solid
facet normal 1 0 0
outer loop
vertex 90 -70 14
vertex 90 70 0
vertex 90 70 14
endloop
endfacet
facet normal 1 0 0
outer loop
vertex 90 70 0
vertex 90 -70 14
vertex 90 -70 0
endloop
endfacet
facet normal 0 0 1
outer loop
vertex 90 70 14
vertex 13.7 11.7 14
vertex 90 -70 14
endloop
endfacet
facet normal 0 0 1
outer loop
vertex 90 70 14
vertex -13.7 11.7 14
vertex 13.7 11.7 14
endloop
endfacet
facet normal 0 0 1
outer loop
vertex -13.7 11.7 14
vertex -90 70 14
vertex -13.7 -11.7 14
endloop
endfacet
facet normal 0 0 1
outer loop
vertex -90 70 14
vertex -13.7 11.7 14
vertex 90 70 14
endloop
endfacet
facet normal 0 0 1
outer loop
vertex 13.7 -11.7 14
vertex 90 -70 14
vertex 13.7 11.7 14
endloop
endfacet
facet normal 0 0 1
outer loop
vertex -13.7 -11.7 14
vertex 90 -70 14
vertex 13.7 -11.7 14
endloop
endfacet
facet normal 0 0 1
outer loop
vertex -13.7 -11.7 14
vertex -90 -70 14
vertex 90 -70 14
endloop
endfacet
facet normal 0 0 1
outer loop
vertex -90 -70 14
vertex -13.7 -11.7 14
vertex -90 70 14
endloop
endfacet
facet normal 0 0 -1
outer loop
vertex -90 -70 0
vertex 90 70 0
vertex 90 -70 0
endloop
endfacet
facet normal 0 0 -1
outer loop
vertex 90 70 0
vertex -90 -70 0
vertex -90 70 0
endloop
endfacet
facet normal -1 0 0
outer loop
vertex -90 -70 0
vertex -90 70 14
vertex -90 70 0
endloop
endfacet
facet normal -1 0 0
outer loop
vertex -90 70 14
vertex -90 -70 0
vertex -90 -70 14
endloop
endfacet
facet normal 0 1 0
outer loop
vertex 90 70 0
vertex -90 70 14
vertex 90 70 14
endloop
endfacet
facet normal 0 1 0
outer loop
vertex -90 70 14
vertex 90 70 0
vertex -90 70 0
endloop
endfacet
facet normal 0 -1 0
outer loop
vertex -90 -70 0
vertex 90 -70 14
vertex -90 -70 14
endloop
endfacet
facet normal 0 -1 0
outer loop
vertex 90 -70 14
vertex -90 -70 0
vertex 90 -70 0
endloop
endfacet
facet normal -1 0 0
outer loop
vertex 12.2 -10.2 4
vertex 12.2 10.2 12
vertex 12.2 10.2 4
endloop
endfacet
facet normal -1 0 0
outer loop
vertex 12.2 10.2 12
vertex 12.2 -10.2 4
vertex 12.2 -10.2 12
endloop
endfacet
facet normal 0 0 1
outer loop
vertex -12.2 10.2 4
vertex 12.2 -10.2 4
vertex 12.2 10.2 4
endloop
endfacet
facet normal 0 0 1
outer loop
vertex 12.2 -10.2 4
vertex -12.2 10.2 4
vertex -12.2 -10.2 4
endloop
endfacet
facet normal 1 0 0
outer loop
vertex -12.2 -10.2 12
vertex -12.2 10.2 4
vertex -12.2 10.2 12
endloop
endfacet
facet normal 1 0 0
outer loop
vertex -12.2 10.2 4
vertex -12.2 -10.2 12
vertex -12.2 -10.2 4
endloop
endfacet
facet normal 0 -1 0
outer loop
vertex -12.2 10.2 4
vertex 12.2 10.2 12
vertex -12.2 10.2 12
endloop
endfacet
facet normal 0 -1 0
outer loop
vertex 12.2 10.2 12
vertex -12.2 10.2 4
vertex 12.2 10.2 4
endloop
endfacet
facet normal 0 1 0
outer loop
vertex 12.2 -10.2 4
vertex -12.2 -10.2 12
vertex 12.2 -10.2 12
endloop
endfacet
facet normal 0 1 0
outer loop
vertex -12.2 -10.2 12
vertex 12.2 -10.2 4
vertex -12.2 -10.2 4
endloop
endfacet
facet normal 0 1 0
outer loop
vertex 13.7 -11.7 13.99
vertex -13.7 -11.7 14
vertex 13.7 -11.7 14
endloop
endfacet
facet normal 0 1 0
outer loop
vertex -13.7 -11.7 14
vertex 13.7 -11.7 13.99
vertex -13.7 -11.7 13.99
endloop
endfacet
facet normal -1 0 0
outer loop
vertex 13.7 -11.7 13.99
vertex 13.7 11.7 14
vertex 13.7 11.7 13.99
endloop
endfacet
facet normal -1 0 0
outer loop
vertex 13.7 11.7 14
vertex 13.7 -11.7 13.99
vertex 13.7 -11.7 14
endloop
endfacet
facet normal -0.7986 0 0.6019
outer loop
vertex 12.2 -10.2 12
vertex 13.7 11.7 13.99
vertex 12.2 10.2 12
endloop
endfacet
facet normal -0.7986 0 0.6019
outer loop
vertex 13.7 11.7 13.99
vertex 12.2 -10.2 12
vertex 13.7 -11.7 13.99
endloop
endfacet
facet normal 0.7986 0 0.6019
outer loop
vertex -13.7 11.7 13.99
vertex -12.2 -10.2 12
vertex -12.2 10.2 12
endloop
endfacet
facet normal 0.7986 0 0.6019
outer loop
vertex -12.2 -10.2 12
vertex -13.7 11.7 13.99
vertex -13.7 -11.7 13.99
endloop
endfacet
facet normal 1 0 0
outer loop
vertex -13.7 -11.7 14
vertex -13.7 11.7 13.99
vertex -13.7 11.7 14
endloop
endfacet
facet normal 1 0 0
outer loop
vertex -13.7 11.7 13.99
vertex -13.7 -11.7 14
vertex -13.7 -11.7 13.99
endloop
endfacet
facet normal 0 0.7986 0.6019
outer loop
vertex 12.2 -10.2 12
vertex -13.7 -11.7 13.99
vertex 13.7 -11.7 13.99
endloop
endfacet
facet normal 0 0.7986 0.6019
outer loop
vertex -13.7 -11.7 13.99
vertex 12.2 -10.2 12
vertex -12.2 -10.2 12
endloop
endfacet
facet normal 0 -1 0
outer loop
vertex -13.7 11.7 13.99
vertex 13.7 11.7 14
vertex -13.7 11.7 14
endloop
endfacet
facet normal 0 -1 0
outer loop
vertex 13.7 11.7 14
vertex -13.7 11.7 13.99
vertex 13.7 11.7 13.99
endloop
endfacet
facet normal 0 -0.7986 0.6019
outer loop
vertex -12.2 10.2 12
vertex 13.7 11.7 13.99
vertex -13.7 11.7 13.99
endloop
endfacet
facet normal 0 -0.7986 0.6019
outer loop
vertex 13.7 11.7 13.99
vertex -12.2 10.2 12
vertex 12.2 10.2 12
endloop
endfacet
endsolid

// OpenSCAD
// Headphone stand: base, post, hanger. Units mm. Print orientation = export orientation (+Z up).
part = "base"; // [base, post, hanger, assembly]
cadverify_only = "";

/* Parameters */
base_L = 180; base_W = 140; base_H = 14;
base_sock_L = 24.4; base_sock_W = 20.4; base_sock_D = 10; // depth from top
base_floor = base_H - base_sock_D; // 4
base_cham_H = 2; base_cham_extra = 1.5; // per side funnel

post_low_L = 24; post_low_W = 20; post_low_H = 10;
post_flare_H = 6;
post_shaft_L = 34; post_shaft_W = 28;
post_shaft_bot = post_low_H + post_flare_H; // 16
post_shaft_top = 230;
post_shaft_H = post_shaft_top - post_shaft_bot; // 214
post_up_L = 20; post_up_W = 16; post_up_H = 12;
post_up_cham_H = 1.5; post_up_cham_extra = 1.5; // per side taper at top
post_H = post_shaft_top + post_up_H; // 242

hanger_L = 120; hanger_W = 36; hanger_base_H = 14; hanger_R = 18; // half-cyl radius = W/2
hanger_cyl_H = 18; // cylinder peak 14+18=32
lip_L = 10; lip_W = 36; lip_bot = 14; lip_top = 36; // end stops 14..36
hanger_H = 36;
hanger_sock_L = 20.4; hanger_sock_W = 16.4; hanger_sock_D = 12; // straight depth from bottom
hanger_roof_H = 10; // triangular roof above straight, ridge along X
hanger_cham_H = 2; hanger_cham_extra = 1.5;

asm_post_Z = base_floor; // 4, post bottom in assembly
asm_hanger_Z = 234; // hanger bottom in assembly
// shaft top 230 + post bottom 4 = 234 = hanger bottom; tenon 230..242 -> hanger 0..12; hanger top 234+36=270

module instance(name, part, unit = 1) {
    echo(cadverify_instance = [name, part, unit]);
    if (cadverify_only == "" || cadverify_only == name) children();
}

module base_part() {
    difference() {
        translate([-base_L/2, -base_W/2, 0]) cube([base_L, base_W, base_H]);
        // straight socket
        translate([-base_sock_L/2, -base_sock_W/2, base_floor])
            cube([base_sock_L, base_sock_W, base_sock_D+0.01]);
        // entry funnel (frustum widening upward)
        hull() {
            translate([-base_sock_L/2, -base_sock_W/2, base_H-base_cham_H])
                cube([base_sock_L, base_sock_W, 0.01]);
            translate([-(base_sock_L/2+base_cham_extra), -(base_sock_W/2+base_cham_extra), base_H-0.01])
                cube([base_sock_L+2*base_cham_extra, base_sock_W+2*base_cham_extra, 0.01]);
        }
    }
}

module post_part() {
    // lower tenon (press fit into base)
    translate([-post_low_L/2, -post_low_W/2, 0]) cube([post_low_L, post_low_W, post_low_H]);
    // flare collar 45deg-compatible transition to shaft
    hull() {
        translate([-post_low_L/2, -post_low_W/2, post_low_H-0.01])
            cube([post_low_L, post_low_W, 0.01]);
        translate([-post_shaft_L/2, -post_shaft_W/2, post_shaft_bot-0.01])
            cube([post_shaft_L, post_shaft_W, 0.01]);
    }
    // shaft
    translate([-post_shaft_L/2, -post_shaft_W/2, post_shaft_bot])
        cube([post_shaft_L, post_shaft_W, post_shaft_H]);
    // upper tenon straight part
    translate([-post_up_L/2, -post_up_W/2, post_shaft_top])
        cube([post_up_L, post_up_W, post_up_H-post_up_cham_H]);
    // upper tenon lead chamfer (tapers inward going up)
    hull() {
        translate([-post_up_L/2, -post_up_W/2, post_H-post_up_cham_H-0.01])
            cube([post_up_L, post_up_W, 0.01]);
        translate([-(post_up_L/2-post_up_cham_extra), -(post_up_W/2-post_up_cham_extra), post_H-0.01])
            cube([post_up_L-2*post_up_cham_extra, post_up_W-2*post_up_cham_extra, 0.01]);
    }
}

module hanger_part() {
    difference() {
        union() {
            // base box
            translate([-hanger_L/2, -hanger_W/2, 0]) cube([hanger_L, hanger_W, hanger_base_H]);
            // rounded top: half cylinder along X
            intersection() {
                translate([0, 0, hanger_base_H]) rotate([0, 90, 0])
                    cylinder(r=hanger_R, h=hanger_L, center=true, $fn=128);
                translate([-hanger_L/2, -hanger_W/2, hanger_base_H]) cube([hanger_L, hanger_W, hanger_cyl_H]);
            }
            // end stops (full height from base top, no floating ledge)
            for (sx=[-1,1])
                translate([sx*(hanger_L/2-lip_L), -lip_W/2, lip_bot])
                    cube([lip_L, lip_W, lip_top-lip_bot]);
        }
        // straight socket
        translate([-hanger_sock_L/2, -hanger_sock_W/2, 0])
            cube([hanger_sock_L, hanger_sock_W, hanger_sock_D]);
        // entry funnel at mouth (widens downward)
        hull() {
            translate([-hanger_sock_L/2, -hanger_sock_W/2, hanger_cham_H])
                cube([hanger_sock_L, hanger_sock_W, 0.01]);
            translate([-(hanger_sock_L/2+hanger_cham_extra), -(hanger_sock_W/2+hanger_cham_extra), -0.01])
                cube([hanger_sock_L+2*hanger_cham_extra, hanger_sock_W+2*hanger_cham_extra, 0.01]);
        }
        // pointed roof above straight (ridge along X), self-supporting slopes
        // closed wedge: sharp apex edge, no flat -> no overhang patch
        polyhedron(
            points = [
                [-hanger_sock_L/2, -hanger_sock_W/2, hanger_sock_D],
                [ hanger_sock_L/2, -hanger_sock_W/2, hanger_sock_D],
                [ hanger_sock_L/2,  hanger_sock_W/2, hanger_sock_D],
                [-hanger_sock_L/2,  hanger_sock_W/2, hanger_sock_D],
                [-hanger_sock_L/2, 0, hanger_sock_D+hanger_roof_H],
                [ hanger_sock_L/2, 0, hanger_sock_D+hanger_roof_H]
            ],
            faces = [
                [0, 3, 2, 1],
                [0, 1, 5, 4],
                [2, 3, 4, 5],
                [0, 4, 3],
                [1, 2, 5]
            ]
        );
    }
}

// --- specs (print coords) ---
if (part == "base") {
    echo(cadverify_spec = [
        ["bounds", [[-base_L/2, -base_W/2, 0], [base_L/2, base_W/2, base_H]]],
        ["bodies", 1],
        ["through_holes", 0],
        ["support_faces", [["base_bottom", "-z", 20000]]],
        ["overhangs_allowed", []],
        ["copies", 1],
        ["details", [
            ["base_plate", "material", [[50, 40, 0], [80, 60, base_H]], 0.9],
            ["socket", "void", [[-base_sock_L/2, -base_sock_W/2, base_floor], [base_sock_L/2, base_sock_W/2, base_H]], 0.9],
            ["socket_funnel", "void", [[-(base_sock_L/2+base_cham_extra), -(base_sock_W/2+base_cham_extra), base_H-base_cham_H], [base_sock_L/2+base_cham_extra, base_sock_W/2+base_cham_extra, base_H]], 0.7],
            ["floor", "thickness", [0, 0, -1], [0, 0, 1], base_floor],
            ["top_face", "view", [[-60, -50, base_H-1], [60, 50, base_H+1]]]
        ]]
    ]);
    base_part();
} else if (part == "post") {
    echo(cadverify_spec = [
        ["bounds", [[-post_shaft_L/2, -post_shaft_W/2, 0], [post_shaft_L/2, post_shaft_W/2, post_H]]],
        ["bodies", 1],
        ["through_holes", 0],
        ["support_faces", [["post_bottom", "-z", 400]]],
        ["overhangs_allowed", []],
        ["copies", 1],
        ["details", [
            ["shaft", "material", [[-10, -8, 60], [10, 8, 160]], 0.9],
            ["lower_tenon", "material", [[-post_low_L/2, -post_low_W/2, 0], [post_low_L/2, post_low_W/2, post_low_H]], 0.9],
            ["upper_tenon", "material", [[-post_up_L/2, -post_up_W/2, post_shaft_top], [post_up_L/2, post_up_W/2, post_H]], 0.8],
            ["collar", "material", [[-14, -12, post_low_H], [14, 12, post_shaft_bot]], 0.7],
            ["shaft_wall", "thickness", [30, 0, 116], [-1, 0, 0], post_shaft_L],
            ["tenon_tip", "view", [[-post_up_L/2, -post_up_W/2, post_H-4], [post_up_L/2, post_up_W/2, post_H+1]]]
        ]]
    ]);
    post_part();
} else if (part == "hanger") {
    echo(cadverify_spec = [
        ["bounds", [[-hanger_L/2, -hanger_W/2, 0], [hanger_L/2, hanger_W/2, hanger_H]]],
        ["bodies", 1],
        ["through_holes", 0],
        ["support_faces", [["hanger_bottom", "-z", 3000]]],
        ["overhangs_allowed", []],
        ["copies", 1],
        ["details", [
            ["saddle", "material", [[-40, -8, 20], [40, 8, 26]], 0.9],
            ["end_stop", "material", [[hanger_L/2-lip_L, -lip_W/2, lip_bot], [hanger_L/2, lip_W/2, lip_top]], 0.9],
            ["socket", "void", [[-hanger_sock_L/2, -hanger_sock_W/2, 0], [hanger_sock_L/2, hanger_sock_W/2, hanger_sock_D]], 0.9],
            ["socket_funnel", "void", [[-(hanger_sock_L/2+hanger_cham_extra), -(hanger_sock_W/2+hanger_cham_extra), 0], [hanger_sock_L/2+hanger_cham_extra, hanger_sock_W/2+hanger_cham_extra, hanger_cham_H]], 0.7],
            ["top_skin", "thickness", [0, 0, hanger_H+4], [0, 0, -1], (hanger_base_H+hanger_cyl_H)-(hanger_sock_D+hanger_roof_H)],
            ["round_top", "view", [[-40, -hanger_W/2, hanger_base_H], [40, hanger_W/2, hanger_base_H+hanger_cyl_H+1]]]
        ]]
    ]);
    hanger_part();
} else if (part == "assembly") {
    echo(cadverify_spec = [
        ["bounds", [[-base_L/2, -base_W/2, 0], [base_L/2, base_W/2, asm_hanger_Z+hanger_H]]],
        ["support_faces", [["desk", "-z", 20000]]],
        ["allowed_interferences", []],
        ["motions", []],
        ["assembly_order", [
            [[ "base_inst" ], [0, 0, 0]],
            [[ "post_inst" ], [0, 0, -1]],
            [[ "hanger_inst" ], [0, 0, -1]]
        ]],
        ["overhangs_allowed", []]
    ]);
    instance("base_inst", "base") base_part();
    instance("post_inst", "post") translate([0, 0, asm_post_Z]) post_part();
    instance("hanger_inst", "hanger") translate([0, 0, asm_hanger_Z]) hanger_part();
}
